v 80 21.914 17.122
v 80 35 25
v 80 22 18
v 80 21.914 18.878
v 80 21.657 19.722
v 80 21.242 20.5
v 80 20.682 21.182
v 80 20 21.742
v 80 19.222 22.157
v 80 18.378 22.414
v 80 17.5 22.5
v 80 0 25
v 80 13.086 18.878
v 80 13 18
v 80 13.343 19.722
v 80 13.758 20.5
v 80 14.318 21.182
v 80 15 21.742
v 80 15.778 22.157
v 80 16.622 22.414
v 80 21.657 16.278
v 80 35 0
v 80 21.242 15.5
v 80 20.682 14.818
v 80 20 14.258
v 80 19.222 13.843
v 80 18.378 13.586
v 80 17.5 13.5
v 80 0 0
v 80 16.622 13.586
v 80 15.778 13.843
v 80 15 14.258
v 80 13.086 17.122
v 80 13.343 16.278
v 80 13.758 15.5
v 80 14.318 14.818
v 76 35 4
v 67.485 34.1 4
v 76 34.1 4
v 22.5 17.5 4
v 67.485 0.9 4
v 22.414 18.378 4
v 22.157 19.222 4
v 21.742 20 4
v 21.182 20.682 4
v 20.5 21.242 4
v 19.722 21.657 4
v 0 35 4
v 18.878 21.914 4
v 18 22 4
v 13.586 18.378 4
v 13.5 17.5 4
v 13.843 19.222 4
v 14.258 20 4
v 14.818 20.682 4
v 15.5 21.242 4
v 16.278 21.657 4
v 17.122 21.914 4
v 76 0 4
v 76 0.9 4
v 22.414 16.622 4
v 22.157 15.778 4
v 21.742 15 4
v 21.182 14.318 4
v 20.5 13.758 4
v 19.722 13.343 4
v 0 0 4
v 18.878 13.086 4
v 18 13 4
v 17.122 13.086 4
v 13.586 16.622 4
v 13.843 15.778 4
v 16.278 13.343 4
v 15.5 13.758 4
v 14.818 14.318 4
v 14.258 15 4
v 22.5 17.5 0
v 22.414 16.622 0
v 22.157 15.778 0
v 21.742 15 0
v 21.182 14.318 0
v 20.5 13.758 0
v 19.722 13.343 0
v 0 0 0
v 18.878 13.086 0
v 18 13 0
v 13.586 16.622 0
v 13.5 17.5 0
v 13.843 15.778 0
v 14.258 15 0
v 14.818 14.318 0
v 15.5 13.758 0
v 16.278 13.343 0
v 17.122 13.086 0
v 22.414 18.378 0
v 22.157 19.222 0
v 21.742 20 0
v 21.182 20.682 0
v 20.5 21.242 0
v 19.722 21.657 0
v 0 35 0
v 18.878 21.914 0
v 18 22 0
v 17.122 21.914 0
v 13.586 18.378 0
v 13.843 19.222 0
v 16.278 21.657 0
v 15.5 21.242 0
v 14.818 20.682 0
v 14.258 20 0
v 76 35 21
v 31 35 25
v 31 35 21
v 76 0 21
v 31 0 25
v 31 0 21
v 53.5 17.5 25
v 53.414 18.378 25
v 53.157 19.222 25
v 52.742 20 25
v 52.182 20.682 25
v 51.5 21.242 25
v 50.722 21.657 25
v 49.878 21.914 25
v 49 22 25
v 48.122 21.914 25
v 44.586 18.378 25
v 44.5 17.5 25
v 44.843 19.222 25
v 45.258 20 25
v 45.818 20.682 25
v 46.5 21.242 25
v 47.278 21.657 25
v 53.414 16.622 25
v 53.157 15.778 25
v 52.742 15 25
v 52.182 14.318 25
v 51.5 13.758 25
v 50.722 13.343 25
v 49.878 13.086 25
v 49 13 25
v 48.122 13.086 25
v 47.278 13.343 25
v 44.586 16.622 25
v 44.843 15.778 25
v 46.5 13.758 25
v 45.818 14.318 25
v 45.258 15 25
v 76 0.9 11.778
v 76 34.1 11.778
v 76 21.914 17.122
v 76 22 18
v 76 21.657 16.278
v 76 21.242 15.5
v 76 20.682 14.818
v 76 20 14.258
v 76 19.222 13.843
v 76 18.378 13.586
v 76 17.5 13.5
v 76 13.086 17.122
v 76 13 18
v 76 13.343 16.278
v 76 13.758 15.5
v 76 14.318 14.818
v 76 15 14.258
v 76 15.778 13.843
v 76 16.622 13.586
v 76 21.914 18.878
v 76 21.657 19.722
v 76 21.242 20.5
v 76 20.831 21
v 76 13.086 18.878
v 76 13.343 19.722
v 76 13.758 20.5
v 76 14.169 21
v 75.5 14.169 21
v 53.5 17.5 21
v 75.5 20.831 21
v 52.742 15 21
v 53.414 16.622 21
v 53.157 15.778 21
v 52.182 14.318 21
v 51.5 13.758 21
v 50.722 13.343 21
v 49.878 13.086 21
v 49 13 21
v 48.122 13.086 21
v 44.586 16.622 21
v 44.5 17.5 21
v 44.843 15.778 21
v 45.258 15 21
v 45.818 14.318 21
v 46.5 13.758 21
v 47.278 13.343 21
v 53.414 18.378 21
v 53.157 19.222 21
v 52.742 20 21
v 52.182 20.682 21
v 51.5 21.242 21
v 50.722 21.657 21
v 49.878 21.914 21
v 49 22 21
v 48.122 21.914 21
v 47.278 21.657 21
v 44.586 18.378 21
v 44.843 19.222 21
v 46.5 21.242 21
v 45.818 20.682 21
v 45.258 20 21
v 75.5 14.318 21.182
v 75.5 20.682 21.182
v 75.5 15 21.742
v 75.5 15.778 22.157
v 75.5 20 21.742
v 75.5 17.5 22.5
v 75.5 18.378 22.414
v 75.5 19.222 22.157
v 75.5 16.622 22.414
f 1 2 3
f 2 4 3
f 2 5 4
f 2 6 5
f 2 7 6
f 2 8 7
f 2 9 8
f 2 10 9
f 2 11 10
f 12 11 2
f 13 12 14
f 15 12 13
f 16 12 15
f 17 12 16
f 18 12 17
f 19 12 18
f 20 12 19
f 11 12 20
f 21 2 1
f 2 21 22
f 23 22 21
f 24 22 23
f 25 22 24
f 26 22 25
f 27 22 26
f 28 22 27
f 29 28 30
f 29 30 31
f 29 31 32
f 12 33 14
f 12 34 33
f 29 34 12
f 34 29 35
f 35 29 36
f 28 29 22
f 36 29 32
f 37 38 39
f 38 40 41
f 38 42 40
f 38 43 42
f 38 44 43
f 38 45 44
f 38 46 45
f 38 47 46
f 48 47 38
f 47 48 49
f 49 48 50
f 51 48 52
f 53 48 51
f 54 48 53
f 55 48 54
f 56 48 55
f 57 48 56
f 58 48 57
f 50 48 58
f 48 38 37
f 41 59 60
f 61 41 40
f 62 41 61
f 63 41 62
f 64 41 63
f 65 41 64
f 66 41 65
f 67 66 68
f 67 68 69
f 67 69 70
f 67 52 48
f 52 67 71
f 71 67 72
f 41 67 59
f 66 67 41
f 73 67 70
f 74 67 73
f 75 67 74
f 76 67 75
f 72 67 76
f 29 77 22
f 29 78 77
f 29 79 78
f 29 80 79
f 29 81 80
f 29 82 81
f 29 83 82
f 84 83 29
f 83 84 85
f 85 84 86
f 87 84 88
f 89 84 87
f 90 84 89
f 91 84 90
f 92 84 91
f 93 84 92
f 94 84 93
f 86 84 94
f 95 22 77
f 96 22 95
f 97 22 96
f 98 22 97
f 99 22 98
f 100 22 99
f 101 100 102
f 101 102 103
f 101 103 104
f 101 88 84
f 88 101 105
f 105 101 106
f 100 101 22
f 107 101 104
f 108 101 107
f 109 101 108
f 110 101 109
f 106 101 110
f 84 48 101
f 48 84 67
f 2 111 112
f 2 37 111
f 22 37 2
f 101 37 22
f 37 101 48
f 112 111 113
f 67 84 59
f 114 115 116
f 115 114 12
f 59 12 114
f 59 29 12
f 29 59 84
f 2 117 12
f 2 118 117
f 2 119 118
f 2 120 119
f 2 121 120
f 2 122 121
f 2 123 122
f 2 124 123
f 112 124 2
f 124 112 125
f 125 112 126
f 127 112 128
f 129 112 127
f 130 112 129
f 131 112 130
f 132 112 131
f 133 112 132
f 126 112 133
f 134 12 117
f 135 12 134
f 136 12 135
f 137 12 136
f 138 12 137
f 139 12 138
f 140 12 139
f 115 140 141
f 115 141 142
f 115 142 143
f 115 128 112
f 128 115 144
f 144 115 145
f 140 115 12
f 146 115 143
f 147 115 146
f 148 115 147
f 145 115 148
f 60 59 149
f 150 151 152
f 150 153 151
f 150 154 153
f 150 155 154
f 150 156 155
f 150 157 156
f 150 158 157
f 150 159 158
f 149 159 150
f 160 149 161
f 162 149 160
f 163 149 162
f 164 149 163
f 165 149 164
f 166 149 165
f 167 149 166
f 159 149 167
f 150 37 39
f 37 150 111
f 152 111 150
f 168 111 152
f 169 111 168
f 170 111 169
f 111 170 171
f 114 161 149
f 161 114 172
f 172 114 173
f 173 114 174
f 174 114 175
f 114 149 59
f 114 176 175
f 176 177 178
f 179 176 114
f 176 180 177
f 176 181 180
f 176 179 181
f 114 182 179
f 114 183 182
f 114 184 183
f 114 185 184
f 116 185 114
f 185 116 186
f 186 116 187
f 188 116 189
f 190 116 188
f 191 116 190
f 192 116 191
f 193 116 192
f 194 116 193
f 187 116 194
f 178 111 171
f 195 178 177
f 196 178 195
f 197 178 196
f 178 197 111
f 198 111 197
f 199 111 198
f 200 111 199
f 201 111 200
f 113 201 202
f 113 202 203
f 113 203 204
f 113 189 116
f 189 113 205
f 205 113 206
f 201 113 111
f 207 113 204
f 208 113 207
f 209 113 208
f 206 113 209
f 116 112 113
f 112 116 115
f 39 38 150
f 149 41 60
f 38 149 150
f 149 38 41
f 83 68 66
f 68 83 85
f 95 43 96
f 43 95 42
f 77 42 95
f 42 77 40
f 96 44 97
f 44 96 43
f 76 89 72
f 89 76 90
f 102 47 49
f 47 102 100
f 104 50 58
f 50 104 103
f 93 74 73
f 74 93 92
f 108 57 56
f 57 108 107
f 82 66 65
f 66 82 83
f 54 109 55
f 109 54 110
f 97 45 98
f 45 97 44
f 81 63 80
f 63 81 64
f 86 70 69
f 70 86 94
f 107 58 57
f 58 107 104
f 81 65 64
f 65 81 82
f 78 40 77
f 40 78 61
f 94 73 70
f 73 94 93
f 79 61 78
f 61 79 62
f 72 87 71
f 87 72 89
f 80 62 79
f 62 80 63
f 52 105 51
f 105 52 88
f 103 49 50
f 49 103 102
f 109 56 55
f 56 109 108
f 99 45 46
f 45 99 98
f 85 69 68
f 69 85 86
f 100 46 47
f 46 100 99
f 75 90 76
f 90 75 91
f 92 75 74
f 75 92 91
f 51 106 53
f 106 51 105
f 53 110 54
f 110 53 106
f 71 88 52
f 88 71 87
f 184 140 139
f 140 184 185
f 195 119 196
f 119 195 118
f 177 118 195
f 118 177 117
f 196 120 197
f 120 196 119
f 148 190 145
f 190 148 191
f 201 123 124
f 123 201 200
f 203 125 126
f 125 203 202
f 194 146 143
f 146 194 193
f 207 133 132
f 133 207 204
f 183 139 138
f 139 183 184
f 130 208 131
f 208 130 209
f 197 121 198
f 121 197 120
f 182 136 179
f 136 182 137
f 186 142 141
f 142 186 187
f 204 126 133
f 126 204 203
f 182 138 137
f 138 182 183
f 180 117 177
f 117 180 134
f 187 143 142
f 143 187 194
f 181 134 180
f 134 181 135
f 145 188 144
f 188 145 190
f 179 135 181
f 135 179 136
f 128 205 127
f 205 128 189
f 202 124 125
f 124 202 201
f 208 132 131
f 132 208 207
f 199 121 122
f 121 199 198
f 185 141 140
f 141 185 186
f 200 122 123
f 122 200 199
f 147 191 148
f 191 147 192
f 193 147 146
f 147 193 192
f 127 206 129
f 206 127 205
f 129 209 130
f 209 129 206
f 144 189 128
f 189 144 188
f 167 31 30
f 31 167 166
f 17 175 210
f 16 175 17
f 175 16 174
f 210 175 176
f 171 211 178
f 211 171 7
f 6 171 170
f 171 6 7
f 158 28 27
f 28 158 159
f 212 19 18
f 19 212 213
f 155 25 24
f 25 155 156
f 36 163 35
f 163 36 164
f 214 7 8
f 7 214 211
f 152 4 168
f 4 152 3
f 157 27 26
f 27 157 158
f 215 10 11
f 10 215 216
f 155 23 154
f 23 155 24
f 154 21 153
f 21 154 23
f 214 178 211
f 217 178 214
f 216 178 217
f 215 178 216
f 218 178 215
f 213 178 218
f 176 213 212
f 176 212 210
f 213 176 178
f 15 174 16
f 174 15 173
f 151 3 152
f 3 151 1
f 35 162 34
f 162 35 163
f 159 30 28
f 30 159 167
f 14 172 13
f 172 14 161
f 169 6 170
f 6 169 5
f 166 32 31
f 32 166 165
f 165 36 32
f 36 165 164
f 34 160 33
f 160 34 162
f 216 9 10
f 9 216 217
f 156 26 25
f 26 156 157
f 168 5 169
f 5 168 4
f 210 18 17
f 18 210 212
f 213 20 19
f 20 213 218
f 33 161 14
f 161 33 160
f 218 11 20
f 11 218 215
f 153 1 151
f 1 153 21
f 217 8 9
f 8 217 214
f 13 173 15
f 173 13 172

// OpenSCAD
$fn = 32;

// ----------------------------------------------------------------------
// Z-bracket: 80 x 35 x 25 mm
// ----------------------------------------------------------------------

// --- parameters (mm) ---
bottom_run = 80;          // lower foot length, X
top_run = 45;             // upper foot length, X
profile_w = 35;           // bracket width, Y
height = 25;              // overall rise, Z
mat_t = 4;                // plate thickness
hole_d = 9;               // clearance for M8
rib_len = 9.5;            // gusset leg
rib_sink = 0.9;           // gusset overlap into the plates

module hole_z(px, py, z0) {
  translate([px, py, z0 - 0.5]) cylinder(h = mat_t + 1, d = hole_d);
}
module hole_x(py, pz) {
  translate([-0.5, py, pz]) rotate([0, 90, 0]) cylinder(h = mat_t + 1, d = hole_d);
}
module gusset(x0) {
  translate([x0, profile_w - rib_sink, 0])
    rotate([90, 0, 0])
      linear_extrude(height = profile_w - 2 * rib_sink)
        polygon(points = [[rib_sink, mat_t - rib_sink],
                          [rib_sink, mat_t - rib_sink + rib_len],
                          [-rib_len, mat_t - rib_sink]]);
}

difference() {
  union() {
    cube([bottom_run, profile_w, mat_t]);
    /* web, overlapping the lower foot */
    translate([bottom_run - mat_t, 0, 0]) cube([mat_t, profile_w, height]);
    /* upper foot, sunk into the web */
    translate([bottom_run - mat_t - top_run, 0, height - mat_t]) cube([top_run + mat_t, profile_w, mat_t]);
    gusset(bottom_run - mat_t);
  }
  hole_z(18, 17.5, 0);
  translate([bottom_run - mat_t - 27, 0, 0]) hole_z(0, 17.5, height - mat_t);
  translate([bottom_run - mat_t, 0, 0]) hole_x(17.5, 18);
}
